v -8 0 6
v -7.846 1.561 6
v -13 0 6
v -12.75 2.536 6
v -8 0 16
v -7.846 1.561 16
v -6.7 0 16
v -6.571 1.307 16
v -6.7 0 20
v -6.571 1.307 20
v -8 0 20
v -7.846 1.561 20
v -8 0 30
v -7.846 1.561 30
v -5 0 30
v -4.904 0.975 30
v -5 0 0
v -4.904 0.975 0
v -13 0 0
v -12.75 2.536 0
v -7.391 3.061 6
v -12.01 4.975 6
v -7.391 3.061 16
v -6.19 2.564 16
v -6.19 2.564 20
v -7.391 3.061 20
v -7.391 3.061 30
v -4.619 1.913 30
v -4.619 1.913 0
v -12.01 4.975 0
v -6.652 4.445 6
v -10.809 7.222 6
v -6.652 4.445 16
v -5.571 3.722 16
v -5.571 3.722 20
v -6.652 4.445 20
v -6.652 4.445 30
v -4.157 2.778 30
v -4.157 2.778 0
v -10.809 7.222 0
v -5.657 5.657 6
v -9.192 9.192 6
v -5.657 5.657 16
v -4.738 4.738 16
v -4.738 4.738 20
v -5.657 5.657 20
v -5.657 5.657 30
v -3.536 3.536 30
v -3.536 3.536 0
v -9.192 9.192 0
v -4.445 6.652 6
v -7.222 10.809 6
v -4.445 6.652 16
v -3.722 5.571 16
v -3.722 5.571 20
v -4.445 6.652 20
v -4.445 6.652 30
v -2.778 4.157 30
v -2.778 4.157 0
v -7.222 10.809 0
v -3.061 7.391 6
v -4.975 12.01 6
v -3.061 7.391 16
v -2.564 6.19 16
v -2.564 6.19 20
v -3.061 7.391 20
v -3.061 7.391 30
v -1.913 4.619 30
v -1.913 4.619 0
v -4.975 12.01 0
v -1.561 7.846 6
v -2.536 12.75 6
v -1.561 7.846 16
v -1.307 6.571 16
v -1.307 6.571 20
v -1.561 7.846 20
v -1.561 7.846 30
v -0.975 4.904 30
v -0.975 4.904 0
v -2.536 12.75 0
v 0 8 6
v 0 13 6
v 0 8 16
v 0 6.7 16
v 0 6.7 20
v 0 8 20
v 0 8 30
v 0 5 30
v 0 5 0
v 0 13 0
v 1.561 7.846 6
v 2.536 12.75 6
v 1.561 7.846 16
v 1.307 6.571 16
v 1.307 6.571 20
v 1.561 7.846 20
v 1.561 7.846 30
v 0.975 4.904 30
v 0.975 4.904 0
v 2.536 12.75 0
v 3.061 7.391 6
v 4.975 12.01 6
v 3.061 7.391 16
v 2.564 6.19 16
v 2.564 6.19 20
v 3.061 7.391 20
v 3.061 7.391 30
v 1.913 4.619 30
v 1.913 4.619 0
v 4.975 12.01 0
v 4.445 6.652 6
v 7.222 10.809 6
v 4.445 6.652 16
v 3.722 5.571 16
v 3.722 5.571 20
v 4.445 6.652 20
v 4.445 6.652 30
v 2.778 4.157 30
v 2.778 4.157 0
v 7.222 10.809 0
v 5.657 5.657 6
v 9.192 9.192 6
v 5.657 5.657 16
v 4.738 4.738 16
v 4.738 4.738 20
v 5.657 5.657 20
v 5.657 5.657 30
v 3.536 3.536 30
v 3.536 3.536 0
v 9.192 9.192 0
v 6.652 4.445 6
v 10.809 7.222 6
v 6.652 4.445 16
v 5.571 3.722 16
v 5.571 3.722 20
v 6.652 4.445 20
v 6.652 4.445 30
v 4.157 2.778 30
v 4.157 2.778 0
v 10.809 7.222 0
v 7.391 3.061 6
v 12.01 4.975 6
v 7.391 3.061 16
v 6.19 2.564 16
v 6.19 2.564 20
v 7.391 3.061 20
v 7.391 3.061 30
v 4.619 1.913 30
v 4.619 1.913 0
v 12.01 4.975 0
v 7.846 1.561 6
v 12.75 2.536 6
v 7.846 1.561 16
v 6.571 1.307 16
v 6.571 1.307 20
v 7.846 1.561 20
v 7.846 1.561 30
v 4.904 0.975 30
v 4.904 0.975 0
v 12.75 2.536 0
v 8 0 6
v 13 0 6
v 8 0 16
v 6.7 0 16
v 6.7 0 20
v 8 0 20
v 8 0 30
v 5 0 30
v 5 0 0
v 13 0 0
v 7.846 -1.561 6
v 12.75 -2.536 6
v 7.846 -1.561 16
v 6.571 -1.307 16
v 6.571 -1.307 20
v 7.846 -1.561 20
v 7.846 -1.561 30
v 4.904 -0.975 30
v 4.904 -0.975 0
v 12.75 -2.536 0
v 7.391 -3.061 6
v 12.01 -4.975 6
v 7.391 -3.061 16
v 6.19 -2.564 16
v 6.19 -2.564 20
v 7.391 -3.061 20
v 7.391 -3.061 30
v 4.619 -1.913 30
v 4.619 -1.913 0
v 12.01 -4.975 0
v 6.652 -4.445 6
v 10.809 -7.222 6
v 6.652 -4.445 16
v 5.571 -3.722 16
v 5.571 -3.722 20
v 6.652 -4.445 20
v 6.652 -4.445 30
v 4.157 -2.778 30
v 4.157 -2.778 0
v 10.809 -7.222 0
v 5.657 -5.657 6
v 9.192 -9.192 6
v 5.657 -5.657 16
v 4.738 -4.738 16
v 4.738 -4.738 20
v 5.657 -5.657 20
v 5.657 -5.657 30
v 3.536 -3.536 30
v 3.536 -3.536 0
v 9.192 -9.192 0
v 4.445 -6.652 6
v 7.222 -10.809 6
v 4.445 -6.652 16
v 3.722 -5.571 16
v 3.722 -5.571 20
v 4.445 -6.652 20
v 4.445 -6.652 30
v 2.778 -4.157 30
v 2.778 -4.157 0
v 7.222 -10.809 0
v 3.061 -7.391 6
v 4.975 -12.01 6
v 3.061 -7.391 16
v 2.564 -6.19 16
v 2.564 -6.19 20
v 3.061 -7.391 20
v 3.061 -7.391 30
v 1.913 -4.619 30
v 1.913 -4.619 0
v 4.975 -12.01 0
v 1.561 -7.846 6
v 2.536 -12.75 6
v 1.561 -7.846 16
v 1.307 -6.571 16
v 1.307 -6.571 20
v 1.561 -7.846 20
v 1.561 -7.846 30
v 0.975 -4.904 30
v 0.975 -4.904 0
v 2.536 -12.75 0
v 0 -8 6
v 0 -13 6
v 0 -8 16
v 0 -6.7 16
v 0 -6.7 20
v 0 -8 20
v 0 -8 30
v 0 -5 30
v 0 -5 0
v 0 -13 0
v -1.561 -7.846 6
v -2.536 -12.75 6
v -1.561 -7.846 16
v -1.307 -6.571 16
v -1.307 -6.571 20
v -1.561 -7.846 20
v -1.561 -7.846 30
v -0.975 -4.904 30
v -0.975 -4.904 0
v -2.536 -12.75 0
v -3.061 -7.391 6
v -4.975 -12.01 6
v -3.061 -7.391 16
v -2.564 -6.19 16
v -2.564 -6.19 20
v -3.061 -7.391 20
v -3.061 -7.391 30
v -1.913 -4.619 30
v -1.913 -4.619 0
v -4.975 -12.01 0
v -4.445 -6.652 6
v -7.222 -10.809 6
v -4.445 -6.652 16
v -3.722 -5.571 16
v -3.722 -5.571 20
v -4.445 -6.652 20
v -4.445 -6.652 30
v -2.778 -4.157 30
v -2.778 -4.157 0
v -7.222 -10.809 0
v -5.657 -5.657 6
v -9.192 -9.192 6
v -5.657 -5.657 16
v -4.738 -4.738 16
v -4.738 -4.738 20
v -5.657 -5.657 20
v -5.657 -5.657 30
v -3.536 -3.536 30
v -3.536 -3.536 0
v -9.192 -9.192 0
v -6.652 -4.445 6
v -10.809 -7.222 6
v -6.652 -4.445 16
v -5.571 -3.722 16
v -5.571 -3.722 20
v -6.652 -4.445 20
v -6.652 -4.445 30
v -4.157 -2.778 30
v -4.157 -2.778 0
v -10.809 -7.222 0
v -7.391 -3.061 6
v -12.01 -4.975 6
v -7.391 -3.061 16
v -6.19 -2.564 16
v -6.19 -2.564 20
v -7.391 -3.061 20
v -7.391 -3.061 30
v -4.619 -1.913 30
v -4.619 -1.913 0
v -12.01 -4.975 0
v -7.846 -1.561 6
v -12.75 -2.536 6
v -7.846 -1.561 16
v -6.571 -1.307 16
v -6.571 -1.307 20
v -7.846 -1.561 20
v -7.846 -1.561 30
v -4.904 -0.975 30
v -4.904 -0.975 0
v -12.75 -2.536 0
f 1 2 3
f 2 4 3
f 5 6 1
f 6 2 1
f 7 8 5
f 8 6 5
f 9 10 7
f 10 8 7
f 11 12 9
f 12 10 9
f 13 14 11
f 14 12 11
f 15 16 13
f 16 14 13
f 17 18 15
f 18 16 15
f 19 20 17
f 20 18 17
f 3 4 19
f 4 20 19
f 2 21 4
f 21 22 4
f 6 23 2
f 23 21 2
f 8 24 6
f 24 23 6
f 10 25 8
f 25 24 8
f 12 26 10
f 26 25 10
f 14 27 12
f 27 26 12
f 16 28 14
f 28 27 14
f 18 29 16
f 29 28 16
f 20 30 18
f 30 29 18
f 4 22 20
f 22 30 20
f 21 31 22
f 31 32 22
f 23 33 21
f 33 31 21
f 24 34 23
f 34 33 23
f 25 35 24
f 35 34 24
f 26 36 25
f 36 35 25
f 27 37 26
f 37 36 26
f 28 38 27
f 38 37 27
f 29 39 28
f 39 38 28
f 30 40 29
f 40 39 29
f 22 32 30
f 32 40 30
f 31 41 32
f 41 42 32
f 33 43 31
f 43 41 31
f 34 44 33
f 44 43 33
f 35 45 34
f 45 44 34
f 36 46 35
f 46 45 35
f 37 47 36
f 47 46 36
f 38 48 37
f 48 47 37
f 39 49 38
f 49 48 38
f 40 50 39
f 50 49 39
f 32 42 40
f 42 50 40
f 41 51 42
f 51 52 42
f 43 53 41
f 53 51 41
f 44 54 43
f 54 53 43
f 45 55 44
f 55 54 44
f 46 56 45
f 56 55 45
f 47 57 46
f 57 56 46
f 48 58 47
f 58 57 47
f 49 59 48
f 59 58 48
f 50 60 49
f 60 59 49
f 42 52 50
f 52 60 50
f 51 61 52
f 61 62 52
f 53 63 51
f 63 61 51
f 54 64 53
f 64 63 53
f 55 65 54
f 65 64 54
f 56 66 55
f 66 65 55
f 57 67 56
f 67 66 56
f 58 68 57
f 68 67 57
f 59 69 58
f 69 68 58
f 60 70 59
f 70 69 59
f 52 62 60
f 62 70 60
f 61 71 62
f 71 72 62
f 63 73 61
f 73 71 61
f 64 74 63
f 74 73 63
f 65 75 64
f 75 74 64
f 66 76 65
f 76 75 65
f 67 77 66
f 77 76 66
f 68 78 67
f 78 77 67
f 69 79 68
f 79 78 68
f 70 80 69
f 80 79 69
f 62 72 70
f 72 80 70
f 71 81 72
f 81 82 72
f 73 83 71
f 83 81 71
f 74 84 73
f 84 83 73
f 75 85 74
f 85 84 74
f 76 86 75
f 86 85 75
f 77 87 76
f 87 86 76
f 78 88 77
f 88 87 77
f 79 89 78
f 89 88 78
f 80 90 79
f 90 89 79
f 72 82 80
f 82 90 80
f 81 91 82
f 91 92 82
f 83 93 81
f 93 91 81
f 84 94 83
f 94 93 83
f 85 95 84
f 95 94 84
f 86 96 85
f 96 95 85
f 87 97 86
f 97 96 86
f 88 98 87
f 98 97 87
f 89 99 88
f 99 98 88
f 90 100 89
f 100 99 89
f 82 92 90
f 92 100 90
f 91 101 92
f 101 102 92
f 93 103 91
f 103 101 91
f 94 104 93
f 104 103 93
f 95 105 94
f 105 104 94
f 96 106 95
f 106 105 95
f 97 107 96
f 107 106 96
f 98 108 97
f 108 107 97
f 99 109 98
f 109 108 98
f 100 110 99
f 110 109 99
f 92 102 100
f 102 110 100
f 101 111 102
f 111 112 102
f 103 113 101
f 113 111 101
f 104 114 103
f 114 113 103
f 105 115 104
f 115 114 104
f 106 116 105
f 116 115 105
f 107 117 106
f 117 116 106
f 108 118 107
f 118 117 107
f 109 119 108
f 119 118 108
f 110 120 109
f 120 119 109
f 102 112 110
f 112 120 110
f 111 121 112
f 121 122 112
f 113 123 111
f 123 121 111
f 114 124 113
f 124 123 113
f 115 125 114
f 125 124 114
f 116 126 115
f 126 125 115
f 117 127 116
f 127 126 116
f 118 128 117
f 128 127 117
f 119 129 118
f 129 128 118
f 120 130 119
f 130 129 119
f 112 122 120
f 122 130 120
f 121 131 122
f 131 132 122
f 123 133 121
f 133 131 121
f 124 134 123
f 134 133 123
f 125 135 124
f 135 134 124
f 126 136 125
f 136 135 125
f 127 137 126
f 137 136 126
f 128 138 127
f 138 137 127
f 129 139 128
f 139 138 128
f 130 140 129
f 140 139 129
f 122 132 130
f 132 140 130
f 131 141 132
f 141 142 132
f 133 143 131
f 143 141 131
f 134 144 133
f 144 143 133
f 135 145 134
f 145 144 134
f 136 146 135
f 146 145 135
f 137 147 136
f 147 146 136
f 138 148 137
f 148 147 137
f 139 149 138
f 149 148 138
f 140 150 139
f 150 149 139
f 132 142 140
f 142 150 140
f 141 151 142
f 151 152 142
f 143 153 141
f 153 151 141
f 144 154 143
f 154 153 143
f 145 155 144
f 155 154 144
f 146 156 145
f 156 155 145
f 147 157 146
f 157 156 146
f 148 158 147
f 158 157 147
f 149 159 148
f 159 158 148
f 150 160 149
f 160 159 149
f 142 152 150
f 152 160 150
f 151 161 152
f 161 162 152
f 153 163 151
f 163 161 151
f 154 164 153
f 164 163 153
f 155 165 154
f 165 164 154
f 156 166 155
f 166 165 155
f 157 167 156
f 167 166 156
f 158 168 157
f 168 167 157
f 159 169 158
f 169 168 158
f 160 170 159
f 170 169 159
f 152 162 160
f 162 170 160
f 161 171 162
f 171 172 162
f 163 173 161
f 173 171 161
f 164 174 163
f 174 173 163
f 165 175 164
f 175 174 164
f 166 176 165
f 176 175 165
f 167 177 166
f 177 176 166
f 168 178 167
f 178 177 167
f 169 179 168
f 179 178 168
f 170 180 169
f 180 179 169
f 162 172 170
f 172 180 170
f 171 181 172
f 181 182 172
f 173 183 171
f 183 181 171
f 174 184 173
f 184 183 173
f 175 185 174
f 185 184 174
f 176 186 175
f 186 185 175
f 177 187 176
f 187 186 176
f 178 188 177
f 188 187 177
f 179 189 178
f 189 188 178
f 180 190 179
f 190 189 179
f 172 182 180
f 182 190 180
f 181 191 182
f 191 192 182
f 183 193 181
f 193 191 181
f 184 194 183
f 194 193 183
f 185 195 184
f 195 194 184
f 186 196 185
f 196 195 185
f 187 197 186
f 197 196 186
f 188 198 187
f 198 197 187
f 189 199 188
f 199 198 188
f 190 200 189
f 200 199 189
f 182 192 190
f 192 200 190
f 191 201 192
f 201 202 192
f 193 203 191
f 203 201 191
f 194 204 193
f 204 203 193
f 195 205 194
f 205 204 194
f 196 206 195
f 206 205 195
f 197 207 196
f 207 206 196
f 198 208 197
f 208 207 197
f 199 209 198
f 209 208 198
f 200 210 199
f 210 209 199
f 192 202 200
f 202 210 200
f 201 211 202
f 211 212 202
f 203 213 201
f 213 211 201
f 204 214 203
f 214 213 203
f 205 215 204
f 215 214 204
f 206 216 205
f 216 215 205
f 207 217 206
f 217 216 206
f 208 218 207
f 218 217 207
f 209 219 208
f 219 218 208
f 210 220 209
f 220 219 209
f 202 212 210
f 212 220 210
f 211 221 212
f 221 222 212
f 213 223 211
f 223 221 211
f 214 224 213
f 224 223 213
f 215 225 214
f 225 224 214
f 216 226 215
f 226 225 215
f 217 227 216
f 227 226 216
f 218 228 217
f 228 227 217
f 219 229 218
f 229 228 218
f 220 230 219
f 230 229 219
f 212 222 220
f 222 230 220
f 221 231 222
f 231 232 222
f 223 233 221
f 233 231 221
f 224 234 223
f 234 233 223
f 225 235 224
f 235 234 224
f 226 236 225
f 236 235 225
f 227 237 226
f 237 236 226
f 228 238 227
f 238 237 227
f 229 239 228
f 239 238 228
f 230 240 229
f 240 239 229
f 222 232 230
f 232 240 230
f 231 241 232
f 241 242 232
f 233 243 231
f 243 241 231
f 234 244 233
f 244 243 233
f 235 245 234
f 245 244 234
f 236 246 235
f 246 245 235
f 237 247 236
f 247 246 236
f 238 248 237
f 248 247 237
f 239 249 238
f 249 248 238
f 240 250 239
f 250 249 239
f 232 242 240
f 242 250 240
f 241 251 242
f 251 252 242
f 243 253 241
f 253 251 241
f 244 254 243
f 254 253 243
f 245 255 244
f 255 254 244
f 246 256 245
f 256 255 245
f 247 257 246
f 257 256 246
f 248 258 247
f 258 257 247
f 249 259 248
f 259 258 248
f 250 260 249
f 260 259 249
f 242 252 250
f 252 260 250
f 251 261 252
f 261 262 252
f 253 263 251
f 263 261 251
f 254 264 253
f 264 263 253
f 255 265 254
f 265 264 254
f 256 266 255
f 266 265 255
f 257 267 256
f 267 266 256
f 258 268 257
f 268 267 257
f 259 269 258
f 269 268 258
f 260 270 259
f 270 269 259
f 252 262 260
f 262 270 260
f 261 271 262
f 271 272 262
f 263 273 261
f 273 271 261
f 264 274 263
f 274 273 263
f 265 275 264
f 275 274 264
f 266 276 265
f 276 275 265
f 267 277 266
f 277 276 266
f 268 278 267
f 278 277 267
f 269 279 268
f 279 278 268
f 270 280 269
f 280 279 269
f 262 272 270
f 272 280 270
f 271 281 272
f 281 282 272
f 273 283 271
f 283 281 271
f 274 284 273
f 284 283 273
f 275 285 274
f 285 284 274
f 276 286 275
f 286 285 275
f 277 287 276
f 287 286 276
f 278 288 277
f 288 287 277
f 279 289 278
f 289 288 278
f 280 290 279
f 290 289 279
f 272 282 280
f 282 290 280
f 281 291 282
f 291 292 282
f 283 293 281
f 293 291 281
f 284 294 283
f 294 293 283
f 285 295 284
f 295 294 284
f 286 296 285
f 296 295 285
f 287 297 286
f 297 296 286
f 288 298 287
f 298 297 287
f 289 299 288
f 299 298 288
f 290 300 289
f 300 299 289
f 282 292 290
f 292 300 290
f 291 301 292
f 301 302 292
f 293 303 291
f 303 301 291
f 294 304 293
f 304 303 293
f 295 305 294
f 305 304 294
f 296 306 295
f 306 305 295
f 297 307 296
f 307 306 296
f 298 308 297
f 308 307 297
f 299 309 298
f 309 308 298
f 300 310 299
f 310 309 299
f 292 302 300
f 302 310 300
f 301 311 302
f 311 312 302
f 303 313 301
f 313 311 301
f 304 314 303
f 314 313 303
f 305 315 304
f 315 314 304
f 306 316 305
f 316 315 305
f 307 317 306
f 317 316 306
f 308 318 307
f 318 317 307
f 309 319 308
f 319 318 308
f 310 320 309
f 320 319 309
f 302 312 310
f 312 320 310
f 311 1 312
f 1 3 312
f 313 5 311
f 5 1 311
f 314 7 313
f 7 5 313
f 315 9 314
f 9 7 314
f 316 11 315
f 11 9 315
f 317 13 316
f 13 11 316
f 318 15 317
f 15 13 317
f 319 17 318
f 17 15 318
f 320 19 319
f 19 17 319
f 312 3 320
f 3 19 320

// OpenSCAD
$fn = 32;

// ----------------------------------------------------------------------
// Grooved revolve: flanged, bore R5
// ----------------------------------------------------------------------

// --- parameters (mm) ---
bore_r = 5;               // bore radius
outer_r = 8;              // outer radius of the body
total_h = 30;             // overall height, Z
wall = 3;                 // radial wall thickness
groove_w = 4;             // groove width
groove_d = 1.3;           // groove depth
grooves = 1;              // number of outer grooves
flange_r = 13;            // flange radius
flange_h = 6;             // flange height

bbox_x = 2 * flange_r;  // full diameter
bore_d = 2 * bore_r;  // bore diameter
body_d = 2 * outer_r;  // body diameter
flange_d = 2 * flange_r;  // flange diameter
revolve_angle = 360;  // full turn around the Z axis

profile = [[5, 0], [8, 0], [13, 0], [13, 6], [8, 6], [8, 16], [6.7, 16], [6.7, 20], [8, 20], [8, 30], [5, 30]];  // primary outline, 11 points, counter clockwise

// --- the one profile operation ---
rotate_extrude(angle = revolve_angle) polygon(points = profile);
